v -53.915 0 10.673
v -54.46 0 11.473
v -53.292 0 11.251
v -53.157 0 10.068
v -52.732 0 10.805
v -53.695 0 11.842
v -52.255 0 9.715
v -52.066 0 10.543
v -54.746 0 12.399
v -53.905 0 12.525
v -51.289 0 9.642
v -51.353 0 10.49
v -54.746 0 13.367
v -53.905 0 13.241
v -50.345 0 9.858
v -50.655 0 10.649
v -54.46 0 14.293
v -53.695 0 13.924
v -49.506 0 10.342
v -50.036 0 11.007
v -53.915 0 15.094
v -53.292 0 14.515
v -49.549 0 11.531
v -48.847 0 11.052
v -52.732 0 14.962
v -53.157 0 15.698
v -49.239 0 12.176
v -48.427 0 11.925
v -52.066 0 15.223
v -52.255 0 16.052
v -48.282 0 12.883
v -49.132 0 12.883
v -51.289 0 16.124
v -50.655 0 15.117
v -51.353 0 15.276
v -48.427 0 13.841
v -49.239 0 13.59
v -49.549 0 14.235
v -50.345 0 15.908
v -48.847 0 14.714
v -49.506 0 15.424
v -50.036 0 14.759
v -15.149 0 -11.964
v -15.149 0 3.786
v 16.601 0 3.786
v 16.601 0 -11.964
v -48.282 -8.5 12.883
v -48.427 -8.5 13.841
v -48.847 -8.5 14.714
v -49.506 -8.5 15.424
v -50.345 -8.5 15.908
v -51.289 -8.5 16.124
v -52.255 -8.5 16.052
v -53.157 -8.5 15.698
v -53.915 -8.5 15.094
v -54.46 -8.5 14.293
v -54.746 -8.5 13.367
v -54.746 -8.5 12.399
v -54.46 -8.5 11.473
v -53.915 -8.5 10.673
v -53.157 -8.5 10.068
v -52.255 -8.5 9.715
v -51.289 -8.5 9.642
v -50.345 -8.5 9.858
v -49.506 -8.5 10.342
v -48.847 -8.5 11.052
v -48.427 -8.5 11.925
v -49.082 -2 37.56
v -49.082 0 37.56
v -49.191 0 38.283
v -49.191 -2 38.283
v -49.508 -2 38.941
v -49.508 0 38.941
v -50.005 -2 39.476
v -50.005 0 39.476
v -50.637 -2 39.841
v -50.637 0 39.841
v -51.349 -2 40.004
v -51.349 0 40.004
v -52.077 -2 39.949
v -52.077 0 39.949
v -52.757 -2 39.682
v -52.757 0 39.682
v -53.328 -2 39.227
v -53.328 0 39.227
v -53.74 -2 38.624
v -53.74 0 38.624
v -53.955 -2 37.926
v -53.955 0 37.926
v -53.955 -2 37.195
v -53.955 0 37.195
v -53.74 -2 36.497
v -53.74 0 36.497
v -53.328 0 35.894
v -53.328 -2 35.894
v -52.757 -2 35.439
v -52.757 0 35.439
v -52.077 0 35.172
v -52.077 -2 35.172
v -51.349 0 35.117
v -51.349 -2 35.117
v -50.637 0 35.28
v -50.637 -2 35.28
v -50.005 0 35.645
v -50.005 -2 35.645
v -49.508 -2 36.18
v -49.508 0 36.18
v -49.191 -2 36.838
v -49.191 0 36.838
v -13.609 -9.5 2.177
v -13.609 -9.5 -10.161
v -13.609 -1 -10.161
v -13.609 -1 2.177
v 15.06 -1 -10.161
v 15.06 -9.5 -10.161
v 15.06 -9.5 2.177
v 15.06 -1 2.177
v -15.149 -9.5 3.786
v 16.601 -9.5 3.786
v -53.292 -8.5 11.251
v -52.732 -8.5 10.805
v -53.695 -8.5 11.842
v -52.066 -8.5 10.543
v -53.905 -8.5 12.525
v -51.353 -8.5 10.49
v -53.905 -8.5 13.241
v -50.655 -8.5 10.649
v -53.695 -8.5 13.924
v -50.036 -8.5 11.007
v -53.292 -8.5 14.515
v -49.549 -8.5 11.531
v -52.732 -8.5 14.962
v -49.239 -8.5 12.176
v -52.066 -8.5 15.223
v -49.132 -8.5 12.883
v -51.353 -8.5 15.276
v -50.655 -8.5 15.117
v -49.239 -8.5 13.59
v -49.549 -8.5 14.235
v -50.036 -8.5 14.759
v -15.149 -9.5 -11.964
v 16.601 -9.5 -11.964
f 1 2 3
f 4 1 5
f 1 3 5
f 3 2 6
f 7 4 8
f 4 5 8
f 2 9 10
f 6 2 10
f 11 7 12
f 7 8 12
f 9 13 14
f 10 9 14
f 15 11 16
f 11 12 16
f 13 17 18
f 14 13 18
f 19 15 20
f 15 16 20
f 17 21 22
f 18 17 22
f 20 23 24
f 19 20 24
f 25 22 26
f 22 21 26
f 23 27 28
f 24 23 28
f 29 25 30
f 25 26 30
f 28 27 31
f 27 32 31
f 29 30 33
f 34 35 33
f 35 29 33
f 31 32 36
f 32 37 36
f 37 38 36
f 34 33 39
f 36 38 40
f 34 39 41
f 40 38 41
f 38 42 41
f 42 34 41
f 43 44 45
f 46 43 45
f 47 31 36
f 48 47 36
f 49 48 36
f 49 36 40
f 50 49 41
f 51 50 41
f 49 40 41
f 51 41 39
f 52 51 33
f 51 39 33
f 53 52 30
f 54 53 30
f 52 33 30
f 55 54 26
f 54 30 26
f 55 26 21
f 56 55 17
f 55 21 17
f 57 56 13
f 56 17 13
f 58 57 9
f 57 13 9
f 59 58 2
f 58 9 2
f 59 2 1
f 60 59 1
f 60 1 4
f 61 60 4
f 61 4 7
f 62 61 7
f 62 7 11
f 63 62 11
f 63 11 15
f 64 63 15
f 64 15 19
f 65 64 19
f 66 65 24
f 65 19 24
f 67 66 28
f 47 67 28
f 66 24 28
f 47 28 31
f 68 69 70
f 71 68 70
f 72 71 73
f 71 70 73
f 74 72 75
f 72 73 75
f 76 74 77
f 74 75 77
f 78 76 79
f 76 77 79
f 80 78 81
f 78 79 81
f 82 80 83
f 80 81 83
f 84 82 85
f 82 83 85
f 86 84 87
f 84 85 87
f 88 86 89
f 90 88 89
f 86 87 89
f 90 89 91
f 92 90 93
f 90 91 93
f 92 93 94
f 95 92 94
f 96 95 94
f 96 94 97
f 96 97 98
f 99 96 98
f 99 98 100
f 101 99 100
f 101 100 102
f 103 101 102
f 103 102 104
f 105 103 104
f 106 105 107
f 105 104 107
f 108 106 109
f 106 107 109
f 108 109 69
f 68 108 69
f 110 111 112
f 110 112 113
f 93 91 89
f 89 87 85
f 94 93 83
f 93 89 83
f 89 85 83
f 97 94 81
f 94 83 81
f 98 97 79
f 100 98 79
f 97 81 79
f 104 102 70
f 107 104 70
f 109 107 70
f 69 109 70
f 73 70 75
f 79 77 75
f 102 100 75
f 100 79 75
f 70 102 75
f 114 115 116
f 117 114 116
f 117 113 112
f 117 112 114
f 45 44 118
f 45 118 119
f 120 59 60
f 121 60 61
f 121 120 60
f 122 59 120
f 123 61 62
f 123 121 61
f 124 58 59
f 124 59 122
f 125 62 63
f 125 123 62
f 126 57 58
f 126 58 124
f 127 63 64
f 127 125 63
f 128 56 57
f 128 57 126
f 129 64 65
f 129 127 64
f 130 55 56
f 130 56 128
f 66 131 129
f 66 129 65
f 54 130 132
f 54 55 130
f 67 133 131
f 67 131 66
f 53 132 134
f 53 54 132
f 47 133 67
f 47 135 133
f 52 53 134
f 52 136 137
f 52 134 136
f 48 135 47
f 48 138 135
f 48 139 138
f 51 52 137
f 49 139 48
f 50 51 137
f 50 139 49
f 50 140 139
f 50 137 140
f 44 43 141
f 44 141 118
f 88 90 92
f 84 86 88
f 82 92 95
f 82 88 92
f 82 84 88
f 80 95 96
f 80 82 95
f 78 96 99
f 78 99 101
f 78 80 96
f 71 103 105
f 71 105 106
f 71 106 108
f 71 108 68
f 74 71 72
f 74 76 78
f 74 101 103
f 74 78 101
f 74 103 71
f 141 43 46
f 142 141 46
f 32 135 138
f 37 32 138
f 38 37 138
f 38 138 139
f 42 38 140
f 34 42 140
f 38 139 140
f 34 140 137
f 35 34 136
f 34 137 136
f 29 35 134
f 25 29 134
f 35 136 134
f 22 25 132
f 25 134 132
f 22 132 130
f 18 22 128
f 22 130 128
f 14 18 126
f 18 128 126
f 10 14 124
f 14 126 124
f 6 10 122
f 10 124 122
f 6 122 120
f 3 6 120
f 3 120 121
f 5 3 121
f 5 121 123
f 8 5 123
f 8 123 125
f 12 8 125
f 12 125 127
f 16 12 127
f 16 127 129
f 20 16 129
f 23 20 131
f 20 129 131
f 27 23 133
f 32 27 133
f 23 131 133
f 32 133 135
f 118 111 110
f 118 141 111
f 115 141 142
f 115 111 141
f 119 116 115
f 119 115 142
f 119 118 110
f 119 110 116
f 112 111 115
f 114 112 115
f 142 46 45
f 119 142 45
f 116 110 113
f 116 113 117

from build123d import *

# Parameters (mm, degrees)
F0_W     = 31.75
F0_H     = 15.75
F1_DEPTH = 9.5
F2_R     = 2.45
F3_DEPTH = 2
F4_W     = 28.669356
F4_H     = 12.33871
F5_DEPTH = 8.5
F6_R     = 3.25
F7_DEPTH = 8.5
F8_R     = 2.4
F9_DEPTH = 8.5


with BuildPart() as f1:
    # F0 (on Front) → F1 (new body)
    with BuildSketch(Plane.XZ):
        with Locations((0.725808, -4.089461)):
            Rectangle(F0_W, F0_H)
    extrude(amount=F1_DEPTH)

    # F4 (on face) → F5 (cut)
    with BuildSketch(Plane.XZ.offset(9.5)):
        with Locations((0.725806, -3.991936)):
            Rectangle(F4_W, F4_H)
    extrude(amount=-F5_DEPTH, mode=Mode.SUBTRACT)


with BuildPart() as f3:
    # F2 (on Front) → F3 (new body)
    with BuildSketch(Plane.XZ):
        with Locations((-51.532261, 37.560485)):
            Circle(F2_R)
    extrude(amount=F3_DEPTH)


with BuildPart() as f7:
    # F6 (on Front) → F7 (new body)
    with BuildSketch(Plane.XZ):
        with Locations((-51.532261, 12.883065)):
            Circle(F6_R)
    extrude(amount=F7_DEPTH)

    # F8 (on face) → F9 (cut)
    with BuildSketch(Plane.XZ.offset(8.5)):
        with Locations((-51.532261, 12.883065)):
            Circle(F8_R)
    extrude(amount=-F9_DEPTH, mode=Mode.SUBTRACT)


solid = Compound([f1.part, f3.part, f7.part])
